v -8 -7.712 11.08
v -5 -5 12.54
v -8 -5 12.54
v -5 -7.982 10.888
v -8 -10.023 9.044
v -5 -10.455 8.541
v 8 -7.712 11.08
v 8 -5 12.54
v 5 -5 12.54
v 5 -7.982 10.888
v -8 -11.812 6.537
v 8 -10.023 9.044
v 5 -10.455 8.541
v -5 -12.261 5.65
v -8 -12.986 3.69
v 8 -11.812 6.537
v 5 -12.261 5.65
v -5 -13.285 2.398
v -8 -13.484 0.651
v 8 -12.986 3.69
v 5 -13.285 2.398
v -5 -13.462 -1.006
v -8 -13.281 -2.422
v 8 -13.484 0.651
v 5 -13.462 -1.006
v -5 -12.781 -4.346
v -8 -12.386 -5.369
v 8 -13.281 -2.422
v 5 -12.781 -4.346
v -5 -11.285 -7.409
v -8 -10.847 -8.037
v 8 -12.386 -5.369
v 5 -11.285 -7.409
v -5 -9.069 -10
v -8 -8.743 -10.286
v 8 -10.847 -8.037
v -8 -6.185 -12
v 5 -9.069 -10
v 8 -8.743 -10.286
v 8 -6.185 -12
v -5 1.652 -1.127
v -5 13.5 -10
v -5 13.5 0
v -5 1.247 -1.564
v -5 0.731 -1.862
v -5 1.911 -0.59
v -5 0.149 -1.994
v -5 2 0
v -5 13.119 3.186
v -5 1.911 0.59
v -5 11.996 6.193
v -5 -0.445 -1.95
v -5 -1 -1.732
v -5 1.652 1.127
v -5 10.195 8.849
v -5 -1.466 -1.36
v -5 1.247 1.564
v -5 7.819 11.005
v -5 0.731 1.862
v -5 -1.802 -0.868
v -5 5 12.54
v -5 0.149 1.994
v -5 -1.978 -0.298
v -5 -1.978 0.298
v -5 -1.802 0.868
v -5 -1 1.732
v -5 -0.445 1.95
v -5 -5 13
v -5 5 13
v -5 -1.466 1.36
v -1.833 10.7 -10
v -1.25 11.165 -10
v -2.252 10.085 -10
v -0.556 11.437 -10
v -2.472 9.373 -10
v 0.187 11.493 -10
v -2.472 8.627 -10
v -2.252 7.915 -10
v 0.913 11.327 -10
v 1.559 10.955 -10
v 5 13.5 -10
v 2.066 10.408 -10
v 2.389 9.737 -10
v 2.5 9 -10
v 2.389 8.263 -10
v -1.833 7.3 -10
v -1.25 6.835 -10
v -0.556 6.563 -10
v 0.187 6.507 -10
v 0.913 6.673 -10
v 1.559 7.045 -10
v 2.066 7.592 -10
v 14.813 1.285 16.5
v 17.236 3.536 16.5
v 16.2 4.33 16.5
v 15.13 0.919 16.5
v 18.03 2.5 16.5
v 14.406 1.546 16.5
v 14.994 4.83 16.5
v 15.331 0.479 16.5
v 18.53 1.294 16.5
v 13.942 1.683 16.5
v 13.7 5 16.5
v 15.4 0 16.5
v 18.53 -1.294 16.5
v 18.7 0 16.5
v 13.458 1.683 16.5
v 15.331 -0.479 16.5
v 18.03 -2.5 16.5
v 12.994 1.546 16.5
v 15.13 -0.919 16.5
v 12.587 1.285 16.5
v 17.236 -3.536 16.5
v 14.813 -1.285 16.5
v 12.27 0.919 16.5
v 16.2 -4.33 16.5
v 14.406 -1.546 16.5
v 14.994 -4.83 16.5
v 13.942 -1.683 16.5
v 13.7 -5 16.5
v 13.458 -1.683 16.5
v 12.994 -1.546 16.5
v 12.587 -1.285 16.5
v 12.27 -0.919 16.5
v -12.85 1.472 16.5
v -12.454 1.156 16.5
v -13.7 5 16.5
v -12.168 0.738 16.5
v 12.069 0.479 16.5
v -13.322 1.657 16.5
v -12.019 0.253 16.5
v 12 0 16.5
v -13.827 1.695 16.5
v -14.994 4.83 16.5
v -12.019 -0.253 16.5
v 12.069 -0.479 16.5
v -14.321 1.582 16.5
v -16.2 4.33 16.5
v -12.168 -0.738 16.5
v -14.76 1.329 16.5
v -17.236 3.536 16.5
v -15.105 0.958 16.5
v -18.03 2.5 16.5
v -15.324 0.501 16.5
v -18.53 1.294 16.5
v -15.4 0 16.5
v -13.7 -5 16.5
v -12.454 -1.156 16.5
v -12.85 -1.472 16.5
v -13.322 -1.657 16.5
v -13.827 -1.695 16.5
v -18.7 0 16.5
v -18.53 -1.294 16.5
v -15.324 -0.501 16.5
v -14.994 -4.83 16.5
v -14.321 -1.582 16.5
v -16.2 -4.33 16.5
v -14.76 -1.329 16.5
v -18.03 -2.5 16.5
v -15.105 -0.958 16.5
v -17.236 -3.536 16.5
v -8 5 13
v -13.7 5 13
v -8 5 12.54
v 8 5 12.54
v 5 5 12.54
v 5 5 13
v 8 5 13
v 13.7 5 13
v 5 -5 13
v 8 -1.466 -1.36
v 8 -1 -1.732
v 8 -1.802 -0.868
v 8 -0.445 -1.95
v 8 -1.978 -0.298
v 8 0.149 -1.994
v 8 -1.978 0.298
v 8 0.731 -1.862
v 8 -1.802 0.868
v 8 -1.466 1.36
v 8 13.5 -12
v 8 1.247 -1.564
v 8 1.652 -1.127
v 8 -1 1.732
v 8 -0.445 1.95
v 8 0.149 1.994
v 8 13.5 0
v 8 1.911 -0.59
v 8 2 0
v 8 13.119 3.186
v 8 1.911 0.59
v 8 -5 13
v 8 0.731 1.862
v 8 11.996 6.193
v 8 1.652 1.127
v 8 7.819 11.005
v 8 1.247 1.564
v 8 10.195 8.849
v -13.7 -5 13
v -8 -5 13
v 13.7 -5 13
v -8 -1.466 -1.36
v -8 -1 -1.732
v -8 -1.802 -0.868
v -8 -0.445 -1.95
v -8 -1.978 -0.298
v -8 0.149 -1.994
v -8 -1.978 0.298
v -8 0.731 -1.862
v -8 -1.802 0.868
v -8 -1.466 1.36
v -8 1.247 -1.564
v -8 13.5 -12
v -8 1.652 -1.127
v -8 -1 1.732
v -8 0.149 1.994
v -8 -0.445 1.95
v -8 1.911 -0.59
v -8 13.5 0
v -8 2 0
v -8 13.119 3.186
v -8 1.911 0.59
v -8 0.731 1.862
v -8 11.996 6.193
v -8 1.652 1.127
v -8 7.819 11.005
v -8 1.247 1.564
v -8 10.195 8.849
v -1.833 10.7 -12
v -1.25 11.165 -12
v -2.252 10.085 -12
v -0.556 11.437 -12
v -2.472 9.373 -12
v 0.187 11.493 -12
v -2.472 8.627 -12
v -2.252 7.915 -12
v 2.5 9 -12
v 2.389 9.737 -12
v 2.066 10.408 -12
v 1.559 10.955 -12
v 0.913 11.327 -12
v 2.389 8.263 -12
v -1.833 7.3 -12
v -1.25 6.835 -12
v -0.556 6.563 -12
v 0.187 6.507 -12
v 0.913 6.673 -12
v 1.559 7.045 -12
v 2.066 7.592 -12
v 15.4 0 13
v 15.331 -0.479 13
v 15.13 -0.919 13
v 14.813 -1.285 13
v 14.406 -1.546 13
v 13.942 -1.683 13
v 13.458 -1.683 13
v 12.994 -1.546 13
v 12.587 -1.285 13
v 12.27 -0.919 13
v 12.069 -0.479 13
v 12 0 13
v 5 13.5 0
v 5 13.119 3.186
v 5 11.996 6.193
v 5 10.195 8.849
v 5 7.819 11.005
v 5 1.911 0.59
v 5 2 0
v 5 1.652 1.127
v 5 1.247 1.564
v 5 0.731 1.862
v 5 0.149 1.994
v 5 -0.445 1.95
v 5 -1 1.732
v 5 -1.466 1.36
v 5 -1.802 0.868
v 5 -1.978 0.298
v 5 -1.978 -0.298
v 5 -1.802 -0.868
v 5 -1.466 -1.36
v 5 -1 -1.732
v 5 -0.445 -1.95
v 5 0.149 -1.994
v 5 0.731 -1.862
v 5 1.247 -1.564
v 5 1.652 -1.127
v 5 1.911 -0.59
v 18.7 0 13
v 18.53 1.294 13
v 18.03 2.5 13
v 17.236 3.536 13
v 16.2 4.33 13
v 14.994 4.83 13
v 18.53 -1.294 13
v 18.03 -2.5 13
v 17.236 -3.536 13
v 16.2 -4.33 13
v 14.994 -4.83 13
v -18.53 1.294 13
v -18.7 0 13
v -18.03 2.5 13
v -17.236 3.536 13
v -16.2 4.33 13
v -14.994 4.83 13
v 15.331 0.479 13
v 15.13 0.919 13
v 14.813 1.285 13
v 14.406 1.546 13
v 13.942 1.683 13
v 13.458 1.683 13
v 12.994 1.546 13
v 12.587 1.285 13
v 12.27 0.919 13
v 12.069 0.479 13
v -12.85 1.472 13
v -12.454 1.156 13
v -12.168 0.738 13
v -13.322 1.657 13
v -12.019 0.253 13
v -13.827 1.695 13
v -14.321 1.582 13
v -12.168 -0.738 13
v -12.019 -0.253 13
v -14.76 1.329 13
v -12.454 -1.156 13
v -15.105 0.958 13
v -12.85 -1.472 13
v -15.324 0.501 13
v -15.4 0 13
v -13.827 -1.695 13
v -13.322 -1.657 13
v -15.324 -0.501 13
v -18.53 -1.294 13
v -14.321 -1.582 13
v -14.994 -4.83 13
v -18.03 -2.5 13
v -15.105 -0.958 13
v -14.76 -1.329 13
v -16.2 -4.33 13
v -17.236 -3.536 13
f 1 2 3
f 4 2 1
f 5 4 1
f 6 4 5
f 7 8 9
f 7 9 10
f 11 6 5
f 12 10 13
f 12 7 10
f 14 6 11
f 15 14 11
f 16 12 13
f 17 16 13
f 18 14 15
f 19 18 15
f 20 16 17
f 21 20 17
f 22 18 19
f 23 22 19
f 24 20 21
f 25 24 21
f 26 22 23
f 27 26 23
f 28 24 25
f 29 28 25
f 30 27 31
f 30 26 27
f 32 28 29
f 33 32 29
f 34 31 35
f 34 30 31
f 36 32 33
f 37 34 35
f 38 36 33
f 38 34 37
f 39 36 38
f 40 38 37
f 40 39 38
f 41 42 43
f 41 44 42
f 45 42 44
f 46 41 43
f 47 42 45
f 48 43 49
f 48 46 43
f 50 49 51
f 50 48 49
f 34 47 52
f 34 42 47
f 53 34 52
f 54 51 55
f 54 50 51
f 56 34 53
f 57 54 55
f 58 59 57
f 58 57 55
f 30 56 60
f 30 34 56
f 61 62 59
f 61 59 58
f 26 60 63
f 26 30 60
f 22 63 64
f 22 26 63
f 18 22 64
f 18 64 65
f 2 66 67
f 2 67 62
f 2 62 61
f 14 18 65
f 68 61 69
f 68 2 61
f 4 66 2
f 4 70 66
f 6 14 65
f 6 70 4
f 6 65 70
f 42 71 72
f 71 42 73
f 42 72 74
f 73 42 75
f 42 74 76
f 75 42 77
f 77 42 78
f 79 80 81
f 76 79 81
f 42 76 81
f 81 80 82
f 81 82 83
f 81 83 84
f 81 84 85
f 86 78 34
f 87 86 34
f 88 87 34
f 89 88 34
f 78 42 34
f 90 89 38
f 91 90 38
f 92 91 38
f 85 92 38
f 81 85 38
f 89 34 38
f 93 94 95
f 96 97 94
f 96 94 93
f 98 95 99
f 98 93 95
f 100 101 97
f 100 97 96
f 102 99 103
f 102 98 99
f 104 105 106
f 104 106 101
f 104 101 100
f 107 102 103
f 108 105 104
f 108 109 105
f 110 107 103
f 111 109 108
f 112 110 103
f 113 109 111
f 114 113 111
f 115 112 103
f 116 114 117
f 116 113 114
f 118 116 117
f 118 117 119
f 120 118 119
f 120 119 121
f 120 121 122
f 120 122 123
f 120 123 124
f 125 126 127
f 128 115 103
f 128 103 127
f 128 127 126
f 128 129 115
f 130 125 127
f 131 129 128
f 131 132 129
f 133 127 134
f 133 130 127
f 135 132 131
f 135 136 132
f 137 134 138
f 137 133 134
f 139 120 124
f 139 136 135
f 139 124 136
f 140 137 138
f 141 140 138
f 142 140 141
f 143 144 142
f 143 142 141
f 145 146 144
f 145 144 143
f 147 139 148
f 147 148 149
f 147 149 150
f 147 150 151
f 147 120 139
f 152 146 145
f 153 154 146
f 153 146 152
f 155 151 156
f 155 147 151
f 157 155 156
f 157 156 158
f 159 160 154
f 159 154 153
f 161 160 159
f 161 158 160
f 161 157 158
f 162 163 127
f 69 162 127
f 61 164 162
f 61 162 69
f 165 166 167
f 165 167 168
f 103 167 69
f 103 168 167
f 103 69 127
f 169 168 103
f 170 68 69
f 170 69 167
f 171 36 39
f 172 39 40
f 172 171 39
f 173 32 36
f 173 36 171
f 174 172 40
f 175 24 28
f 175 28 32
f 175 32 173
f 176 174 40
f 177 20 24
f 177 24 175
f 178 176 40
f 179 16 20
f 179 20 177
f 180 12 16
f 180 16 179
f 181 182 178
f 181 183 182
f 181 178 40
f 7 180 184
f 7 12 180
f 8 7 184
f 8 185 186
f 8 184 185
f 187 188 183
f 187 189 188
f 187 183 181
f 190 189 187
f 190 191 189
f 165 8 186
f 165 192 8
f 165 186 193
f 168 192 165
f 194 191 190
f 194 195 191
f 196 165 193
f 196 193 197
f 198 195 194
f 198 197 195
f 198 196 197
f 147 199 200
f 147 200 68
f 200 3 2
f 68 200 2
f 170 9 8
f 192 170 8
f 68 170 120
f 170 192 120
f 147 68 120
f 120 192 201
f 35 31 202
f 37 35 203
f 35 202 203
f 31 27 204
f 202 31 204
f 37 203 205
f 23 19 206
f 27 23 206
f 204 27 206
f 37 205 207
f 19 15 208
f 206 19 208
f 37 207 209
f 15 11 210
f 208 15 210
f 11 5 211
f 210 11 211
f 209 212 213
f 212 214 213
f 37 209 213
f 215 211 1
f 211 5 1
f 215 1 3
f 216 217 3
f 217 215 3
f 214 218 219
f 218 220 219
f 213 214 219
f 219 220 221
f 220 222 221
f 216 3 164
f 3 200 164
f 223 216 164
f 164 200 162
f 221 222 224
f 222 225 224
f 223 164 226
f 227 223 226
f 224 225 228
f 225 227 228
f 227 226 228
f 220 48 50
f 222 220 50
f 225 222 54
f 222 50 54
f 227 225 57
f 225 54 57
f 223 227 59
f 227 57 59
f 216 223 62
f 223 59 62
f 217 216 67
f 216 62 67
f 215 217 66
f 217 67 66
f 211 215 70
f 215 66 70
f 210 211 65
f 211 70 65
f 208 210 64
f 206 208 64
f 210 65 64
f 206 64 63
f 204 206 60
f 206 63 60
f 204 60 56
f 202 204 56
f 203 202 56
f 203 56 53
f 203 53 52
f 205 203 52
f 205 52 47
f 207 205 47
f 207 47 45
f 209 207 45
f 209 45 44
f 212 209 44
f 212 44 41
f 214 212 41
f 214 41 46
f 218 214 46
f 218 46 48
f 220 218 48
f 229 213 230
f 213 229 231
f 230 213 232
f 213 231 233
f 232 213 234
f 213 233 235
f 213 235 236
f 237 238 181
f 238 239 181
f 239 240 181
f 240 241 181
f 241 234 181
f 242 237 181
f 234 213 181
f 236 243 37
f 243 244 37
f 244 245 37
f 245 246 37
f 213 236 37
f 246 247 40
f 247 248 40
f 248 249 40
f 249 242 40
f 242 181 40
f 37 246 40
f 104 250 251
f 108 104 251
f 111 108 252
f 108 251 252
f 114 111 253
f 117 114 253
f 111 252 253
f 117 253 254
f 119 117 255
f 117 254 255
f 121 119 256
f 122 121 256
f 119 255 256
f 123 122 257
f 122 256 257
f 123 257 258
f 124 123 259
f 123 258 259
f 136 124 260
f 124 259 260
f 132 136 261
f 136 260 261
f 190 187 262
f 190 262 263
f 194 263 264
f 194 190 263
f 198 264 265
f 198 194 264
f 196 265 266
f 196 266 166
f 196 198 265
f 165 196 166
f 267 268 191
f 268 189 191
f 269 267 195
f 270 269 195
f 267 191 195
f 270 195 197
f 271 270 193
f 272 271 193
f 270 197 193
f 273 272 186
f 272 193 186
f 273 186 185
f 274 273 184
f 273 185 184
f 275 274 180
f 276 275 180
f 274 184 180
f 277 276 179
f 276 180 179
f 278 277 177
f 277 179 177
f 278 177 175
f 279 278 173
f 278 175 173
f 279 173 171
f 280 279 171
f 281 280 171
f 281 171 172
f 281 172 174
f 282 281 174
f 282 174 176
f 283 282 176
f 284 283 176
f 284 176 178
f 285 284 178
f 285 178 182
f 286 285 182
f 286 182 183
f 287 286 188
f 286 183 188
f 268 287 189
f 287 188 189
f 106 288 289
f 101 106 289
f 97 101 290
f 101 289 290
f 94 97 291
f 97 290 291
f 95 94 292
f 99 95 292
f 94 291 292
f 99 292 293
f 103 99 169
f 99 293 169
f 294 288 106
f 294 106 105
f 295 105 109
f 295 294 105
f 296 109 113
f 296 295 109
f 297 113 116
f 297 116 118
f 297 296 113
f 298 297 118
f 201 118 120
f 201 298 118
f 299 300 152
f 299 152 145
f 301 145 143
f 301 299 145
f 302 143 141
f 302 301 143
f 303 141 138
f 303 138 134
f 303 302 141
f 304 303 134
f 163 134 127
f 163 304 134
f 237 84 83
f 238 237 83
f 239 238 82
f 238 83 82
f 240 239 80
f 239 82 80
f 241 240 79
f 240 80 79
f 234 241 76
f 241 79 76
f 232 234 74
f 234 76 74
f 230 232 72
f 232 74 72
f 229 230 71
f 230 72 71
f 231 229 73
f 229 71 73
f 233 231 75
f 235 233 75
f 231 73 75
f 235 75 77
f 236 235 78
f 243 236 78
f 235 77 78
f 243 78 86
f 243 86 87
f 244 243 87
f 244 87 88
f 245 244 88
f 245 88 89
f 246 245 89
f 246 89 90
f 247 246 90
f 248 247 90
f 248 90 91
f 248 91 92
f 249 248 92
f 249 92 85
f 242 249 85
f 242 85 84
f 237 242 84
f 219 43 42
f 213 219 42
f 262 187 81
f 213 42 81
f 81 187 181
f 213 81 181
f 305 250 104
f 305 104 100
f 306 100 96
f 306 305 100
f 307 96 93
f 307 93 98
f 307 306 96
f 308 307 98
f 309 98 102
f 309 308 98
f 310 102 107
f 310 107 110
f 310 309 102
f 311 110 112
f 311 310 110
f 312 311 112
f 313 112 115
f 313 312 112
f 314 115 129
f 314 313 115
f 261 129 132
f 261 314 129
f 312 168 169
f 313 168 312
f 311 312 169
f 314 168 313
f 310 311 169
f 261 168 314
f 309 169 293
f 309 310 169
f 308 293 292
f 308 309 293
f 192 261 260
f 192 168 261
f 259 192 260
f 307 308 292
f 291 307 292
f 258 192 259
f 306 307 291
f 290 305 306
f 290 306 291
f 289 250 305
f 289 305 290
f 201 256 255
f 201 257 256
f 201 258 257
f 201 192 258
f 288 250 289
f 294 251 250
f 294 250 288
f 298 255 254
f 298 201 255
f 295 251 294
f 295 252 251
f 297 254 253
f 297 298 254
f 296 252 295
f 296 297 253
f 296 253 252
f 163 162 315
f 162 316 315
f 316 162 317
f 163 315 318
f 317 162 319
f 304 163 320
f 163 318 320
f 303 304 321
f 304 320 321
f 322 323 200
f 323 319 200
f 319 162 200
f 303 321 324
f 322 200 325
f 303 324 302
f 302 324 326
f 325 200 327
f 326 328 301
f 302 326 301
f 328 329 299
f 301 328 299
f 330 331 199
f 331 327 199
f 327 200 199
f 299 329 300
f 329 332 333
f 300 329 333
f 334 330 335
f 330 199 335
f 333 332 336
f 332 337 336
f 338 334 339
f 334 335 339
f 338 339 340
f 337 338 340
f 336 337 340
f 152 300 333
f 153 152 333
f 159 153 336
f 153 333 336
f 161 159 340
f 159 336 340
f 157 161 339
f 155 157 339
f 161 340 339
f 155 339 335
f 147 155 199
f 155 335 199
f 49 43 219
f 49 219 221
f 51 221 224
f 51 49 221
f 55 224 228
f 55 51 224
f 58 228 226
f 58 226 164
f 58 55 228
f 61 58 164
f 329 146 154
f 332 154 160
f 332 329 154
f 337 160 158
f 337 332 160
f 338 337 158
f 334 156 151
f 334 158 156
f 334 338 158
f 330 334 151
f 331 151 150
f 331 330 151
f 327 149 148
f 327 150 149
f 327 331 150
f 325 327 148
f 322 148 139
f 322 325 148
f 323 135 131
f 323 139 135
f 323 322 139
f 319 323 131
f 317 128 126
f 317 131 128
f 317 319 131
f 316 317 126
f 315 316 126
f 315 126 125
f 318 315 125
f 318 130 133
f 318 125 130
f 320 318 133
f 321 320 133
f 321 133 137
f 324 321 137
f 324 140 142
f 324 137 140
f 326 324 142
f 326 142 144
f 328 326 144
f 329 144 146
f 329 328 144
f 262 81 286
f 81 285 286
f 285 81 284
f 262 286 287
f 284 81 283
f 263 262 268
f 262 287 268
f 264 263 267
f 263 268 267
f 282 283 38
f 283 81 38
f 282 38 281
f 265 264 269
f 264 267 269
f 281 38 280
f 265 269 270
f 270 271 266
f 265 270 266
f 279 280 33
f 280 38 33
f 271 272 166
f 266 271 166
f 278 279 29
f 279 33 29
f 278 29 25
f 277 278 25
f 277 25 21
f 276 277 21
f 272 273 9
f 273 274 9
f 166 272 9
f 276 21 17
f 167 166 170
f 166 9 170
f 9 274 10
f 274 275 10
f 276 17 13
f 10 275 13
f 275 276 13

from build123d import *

# Parameters (mm, degrees)
SKETCH005_R                = 2
PAD001_DEPTH               = 8
SKETCH006_W                = 10
SKETCH006_H                = 23
POCKET003_DEPTH            = 13.501
POCKET003_DEPTH_BACK       = 13.501
SKETCH007_R                = 2.5
POCKET004_DEPTH            = 12.001
PAD002_DEPTH               = 3.5
PAD002_MIRRORED007_2_DEPTH = 3.5


with BuildPart() as part:
    # Sketch005 → Pad001 (new body)
    with BuildSketch(Plane.YZ):
        with BuildLine():
            ThreePointArc((13.5, 0), (11.174748, 7.574629), (5, 12.539936))
            Line((5, 16.5), (5, 12.539936))
            Line((-5, 16.5), (5, 16.5))
            Line((-5, 12.539936), (-5, 16.5))
            ThreePointArc((-5, 12.539936), (-13.484297, 0.650951), (-6.184658, -12))
            Line((13.5, -12), (-6.184658, -12))
            Line((13.5, 0), (13.5, -12))
        make_face()
        Circle(SKETCH005_R, mode=Mode.SUBTRACT)
    pad001 = extrude(amount=PAD001_DEPTH)

    # Mirrored006: Pad001 across YZ
    add(pad001.mirror(Plane.YZ))

    # Sketch006 → Pocket003 (cut, two sides)
    with BuildSketch(Plane.XZ) as pocket003_sk:
        with Locations((0, 1.5)):
            Rectangle(SKETCH006_W, SKETCH006_H)
    extrude(amount=-POCKET003_DEPTH, mode=Mode.SUBTRACT)
    extrude(pocket003_sk.sketch, amount=POCKET003_DEPTH_BACK, mode=Mode.SUBTRACT)

    # Sketch007 → Pocket004 (cut, through all)
    with BuildSketch(Plane.XY):
        with Locations((0, 9)):
            Circle(SKETCH007_R)
    extrude(amount=-POCKET004_DEPTH, mode=Mode.SUBTRACT)

    # Sketch008 → Pad002 (join)
    with BuildSketch(Plane.XY.offset(13)):
        with BuildLine():
            Line((13.7, 5), (0, 5))
            Line((0, 5), (0, 0))
            Line((0, 0), (8, 0))
            Line((8, 0), (12, 0))
            ThreePointArc((15.4, 0), (13.7, 1.7), (12, 0))
            Line((15.4, 0), (18.7, 0))
            ThreePointArc((18.7, 0), (17.235534, 3.535534), (13.7, 5))
        make_face()
    pad002 = extrude(amount=PAD002_DEPTH)

    # Sketch008 Mirrored007 2 → Pad002 Mirrored007 2 (add)
    with BuildSketch(Plane(origin=(0, 0, 13), x_dir=(-1, 0, 0), z_dir=(0, 0, -1))):
        with BuildLine():
            Line((13.7, 5), (0, 5))
            Line((0, 5), (0, 0))
            Line((0, 0), (8, 0))
            Line((8, 0), (12, 0))
            ThreePointArc((15.4, 0), (13.7, 1.7), (12, 0))
            Line((15.4, 0), (18.7, 0))
            ThreePointArc((18.7, 0), (17.235534, 3.535534), (13.7, 5))
        make_face()
    pad002_mirrored007_2 = extrude(amount=-PAD002_MIRRORED007_2_DEPTH)

    # Mirrored008: Pad002, Pad002 Mirrored007 2 across Sketch008 H_Axis
    add(pad002.mirror(Plane(origin=(0, 0, 13), x_dir=(0, 0, 1), z_dir=(0, 1, 0))))
    add(pad002_mirrored007_2.mirror(Plane(origin=(0, 0, 13), x_dir=(0, 0, 1), z_dir=(0, 1, 0))))


solid = part.part
